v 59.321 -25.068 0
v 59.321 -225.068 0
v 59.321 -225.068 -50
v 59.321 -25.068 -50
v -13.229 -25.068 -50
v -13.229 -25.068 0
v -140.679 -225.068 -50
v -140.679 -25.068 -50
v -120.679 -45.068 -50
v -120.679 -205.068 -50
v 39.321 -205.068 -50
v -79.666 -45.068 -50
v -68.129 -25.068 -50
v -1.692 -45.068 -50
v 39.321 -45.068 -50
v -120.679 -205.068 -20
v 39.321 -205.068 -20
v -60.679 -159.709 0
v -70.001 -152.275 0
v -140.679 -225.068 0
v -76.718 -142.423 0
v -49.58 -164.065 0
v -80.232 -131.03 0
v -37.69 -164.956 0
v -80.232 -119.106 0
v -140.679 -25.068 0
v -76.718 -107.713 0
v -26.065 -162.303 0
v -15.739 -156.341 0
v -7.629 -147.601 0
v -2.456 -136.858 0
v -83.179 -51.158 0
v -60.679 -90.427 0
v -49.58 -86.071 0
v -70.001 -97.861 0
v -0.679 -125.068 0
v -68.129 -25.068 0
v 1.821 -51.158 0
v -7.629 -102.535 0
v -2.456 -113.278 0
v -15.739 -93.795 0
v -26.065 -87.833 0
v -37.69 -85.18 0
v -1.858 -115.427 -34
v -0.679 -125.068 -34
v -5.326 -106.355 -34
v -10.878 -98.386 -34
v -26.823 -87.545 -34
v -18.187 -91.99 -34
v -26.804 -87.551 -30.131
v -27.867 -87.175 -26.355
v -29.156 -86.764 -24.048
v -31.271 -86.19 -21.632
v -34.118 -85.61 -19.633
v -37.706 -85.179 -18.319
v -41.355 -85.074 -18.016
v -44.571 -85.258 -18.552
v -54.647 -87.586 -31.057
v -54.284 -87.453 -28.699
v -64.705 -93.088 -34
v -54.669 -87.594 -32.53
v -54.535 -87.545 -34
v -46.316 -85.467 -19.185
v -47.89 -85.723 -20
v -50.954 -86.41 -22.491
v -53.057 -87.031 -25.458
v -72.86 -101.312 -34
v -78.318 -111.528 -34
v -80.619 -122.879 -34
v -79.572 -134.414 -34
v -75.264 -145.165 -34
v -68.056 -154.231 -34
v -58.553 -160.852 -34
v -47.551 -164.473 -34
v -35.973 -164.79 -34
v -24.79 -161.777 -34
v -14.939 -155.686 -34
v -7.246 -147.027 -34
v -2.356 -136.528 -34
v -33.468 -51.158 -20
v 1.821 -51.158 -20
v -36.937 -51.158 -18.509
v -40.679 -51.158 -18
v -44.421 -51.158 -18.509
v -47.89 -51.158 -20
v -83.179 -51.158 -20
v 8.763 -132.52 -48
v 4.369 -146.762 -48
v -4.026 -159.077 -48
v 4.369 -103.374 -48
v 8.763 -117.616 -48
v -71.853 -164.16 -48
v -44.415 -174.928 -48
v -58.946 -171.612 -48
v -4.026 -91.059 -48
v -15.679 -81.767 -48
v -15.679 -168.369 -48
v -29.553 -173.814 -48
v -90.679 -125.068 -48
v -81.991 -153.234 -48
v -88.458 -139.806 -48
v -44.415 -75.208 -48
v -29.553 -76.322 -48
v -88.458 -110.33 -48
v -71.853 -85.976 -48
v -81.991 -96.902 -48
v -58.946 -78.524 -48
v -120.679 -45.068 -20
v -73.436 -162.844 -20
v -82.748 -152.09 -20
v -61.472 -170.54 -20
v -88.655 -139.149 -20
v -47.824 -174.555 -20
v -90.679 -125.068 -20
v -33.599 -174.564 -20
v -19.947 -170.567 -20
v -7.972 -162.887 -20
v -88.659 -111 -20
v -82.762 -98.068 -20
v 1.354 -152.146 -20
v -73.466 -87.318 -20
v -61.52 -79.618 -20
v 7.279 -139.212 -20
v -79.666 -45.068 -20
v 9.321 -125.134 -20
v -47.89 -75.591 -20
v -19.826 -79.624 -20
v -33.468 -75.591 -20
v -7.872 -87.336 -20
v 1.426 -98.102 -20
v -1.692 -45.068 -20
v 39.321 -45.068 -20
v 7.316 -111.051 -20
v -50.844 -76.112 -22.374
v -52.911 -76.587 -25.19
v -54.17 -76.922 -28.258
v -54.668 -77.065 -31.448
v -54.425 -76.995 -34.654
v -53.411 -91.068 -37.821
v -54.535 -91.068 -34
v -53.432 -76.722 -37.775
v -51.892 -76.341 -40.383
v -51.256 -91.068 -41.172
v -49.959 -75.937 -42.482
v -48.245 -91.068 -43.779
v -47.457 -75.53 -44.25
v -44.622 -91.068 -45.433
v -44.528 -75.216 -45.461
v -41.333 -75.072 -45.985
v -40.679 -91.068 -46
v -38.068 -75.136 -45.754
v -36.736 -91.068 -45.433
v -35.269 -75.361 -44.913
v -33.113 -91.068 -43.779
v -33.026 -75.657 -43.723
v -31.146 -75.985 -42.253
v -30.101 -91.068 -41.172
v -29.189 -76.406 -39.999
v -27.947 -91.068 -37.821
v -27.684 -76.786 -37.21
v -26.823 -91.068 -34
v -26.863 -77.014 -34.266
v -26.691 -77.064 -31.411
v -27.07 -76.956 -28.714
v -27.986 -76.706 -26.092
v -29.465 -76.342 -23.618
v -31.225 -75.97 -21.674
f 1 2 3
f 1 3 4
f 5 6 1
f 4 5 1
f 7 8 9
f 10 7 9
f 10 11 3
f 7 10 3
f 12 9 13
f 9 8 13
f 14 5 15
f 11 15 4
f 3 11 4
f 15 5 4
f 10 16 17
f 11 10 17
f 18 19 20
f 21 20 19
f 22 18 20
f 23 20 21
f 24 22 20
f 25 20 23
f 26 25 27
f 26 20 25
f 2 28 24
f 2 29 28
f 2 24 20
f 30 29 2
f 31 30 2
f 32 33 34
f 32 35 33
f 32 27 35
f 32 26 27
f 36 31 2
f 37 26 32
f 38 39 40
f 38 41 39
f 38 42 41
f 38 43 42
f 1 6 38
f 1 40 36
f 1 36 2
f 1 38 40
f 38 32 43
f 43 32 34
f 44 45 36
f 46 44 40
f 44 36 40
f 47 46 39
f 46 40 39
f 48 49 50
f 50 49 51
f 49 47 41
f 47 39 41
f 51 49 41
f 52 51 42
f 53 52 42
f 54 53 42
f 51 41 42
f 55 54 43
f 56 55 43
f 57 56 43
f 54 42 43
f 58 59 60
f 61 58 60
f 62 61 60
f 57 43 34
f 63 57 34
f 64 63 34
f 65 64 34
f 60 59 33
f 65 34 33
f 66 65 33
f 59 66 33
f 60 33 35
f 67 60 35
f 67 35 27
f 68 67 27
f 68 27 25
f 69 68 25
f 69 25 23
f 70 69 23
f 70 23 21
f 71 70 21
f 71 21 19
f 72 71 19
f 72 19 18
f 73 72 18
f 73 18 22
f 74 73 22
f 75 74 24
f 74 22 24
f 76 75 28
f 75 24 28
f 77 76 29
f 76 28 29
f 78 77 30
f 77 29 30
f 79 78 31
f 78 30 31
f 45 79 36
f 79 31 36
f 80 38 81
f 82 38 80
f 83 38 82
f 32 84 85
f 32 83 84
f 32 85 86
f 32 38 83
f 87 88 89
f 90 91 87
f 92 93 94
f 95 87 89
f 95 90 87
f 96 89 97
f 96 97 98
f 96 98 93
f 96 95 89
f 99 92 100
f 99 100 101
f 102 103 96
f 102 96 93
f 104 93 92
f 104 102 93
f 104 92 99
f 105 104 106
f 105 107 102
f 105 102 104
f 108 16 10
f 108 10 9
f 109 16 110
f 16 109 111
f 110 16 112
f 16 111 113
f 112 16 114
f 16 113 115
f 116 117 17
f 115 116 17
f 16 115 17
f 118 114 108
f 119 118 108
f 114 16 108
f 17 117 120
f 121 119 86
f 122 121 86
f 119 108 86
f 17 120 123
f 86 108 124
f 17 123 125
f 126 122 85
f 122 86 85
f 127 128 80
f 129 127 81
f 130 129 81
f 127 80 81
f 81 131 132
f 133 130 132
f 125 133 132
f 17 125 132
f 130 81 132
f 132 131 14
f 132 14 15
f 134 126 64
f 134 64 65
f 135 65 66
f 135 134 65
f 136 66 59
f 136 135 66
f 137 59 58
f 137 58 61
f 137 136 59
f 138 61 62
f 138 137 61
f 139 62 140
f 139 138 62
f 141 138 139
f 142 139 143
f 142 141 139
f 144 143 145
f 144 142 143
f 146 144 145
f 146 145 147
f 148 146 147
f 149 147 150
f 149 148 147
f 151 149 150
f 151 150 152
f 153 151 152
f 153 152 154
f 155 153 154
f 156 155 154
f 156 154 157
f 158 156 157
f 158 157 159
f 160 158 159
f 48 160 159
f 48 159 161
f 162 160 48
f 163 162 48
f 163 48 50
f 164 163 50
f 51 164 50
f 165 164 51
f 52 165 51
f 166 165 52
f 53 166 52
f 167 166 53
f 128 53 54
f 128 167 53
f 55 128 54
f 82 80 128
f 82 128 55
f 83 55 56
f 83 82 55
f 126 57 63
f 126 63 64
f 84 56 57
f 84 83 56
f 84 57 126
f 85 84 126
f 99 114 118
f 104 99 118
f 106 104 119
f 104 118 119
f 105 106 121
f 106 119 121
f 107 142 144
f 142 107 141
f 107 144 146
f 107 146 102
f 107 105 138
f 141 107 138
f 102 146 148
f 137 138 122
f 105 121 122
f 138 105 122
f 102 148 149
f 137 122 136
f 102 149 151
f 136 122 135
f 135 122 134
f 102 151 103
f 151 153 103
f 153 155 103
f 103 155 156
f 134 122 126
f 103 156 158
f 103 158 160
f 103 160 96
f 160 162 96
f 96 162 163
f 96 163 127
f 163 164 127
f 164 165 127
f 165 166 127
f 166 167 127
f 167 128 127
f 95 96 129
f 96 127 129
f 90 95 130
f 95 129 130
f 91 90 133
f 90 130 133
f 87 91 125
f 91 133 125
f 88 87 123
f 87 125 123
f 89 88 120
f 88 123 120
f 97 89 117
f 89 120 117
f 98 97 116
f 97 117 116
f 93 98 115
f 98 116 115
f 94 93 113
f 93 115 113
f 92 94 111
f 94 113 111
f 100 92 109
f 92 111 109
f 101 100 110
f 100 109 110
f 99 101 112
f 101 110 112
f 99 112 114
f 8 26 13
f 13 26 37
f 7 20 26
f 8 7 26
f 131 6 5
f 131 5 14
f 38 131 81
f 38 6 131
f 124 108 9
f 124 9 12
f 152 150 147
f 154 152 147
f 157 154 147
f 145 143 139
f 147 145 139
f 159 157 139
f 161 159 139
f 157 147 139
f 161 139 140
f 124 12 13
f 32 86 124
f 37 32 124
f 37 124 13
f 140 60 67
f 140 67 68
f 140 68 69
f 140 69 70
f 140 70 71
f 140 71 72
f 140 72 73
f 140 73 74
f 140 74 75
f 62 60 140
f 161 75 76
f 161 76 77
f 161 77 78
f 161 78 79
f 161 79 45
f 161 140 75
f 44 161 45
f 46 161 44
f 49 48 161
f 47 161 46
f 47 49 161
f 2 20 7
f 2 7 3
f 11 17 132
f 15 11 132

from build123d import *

# Parameters (mm, degrees)
SKETCH2_W           = 200
SKETCH2_H           = 200
BOSS_EXTRUDE1_DEPTH = 50
SHELL1_T            = -20
CUT_EXTRUDE1_DEPTH  = 50
SKETCH5_R           = 50
BOSS_EXTRUDE2_DEPTH = 28
SKETCH6_R           = 40
CUT_EXTRUDE2_DEPTH  = 34
SKETCH7_R           = 14
CUT_EXTRUDE4_DEPTH  = 46


with BuildPart() as part:
    # Sketch2 → Boss-Extrude1 (new body)
    with BuildSketch(Plane.XY):
        with Locations((-40.678946788, -125.067928938)):
            Rectangle(SKETCH2_W, SKETCH2_H)
    extrude(amount=-BOSS_EXTRUDE1_DEPTH)

    # Shell1
    shell1_openings = [part.faces().sort_by_distance(p)[0] for p in [
        (-40.678946788, -125.067928938, -50),
    ]]
    offset(amount=SHELL1_T, openings=shell1_openings, kind=Kind.INTERSECTION)

    # Sketch3 → Cut-Extrude1 (cut)
    with BuildSketch(Plane.XY):
        Polygon((-13.228603608, -25.067928938), (1.821053212, -51.157579637), (-83.178946788, -51.157579637), (-68.129289968, -25.067928938), align=None)
    extrude(amount=-CUT_EXTRUDE1_DEPTH, mode=Mode.SUBTRACT)

    # Sketch5 → Boss-Extrude2 (add)
    with BuildSketch(Plane(origin=(0, 0, -20), x_dir=(-1, 0, 0), z_dir=(0, 0, -1))):
        with Locations((40.678946788, -125.067928938)):
            Circle(SKETCH5_R)
    extrude(amount=BOSS_EXTRUDE2_DEPTH)

    # Sketch6 → Cut-Extrude2 (cut)
    with BuildSketch(Plane.XY):
        with Locations((-40.678946788, -125.067928938)):
            Circle(SKETCH6_R)
    extrude(amount=-CUT_EXTRUDE2_DEPTH, mode=Mode.SUBTRACT)

    # Sketch7 → Cut-Extrude4 (cut)
    with BuildSketch(Plane(origin=(0, -45.067928938, 0), x_dir=(-1, 0, 0), z_dir=(0, -1, 0))):
        with Locations(Location((40.678946788, 32, 0), (0, 0, 301.002719134))):
            Circle(SKETCH7_R)
    extrude(amount=CUT_EXTRUDE4_DEPTH, mode=Mode.SUBTRACT)


solid = part.part
